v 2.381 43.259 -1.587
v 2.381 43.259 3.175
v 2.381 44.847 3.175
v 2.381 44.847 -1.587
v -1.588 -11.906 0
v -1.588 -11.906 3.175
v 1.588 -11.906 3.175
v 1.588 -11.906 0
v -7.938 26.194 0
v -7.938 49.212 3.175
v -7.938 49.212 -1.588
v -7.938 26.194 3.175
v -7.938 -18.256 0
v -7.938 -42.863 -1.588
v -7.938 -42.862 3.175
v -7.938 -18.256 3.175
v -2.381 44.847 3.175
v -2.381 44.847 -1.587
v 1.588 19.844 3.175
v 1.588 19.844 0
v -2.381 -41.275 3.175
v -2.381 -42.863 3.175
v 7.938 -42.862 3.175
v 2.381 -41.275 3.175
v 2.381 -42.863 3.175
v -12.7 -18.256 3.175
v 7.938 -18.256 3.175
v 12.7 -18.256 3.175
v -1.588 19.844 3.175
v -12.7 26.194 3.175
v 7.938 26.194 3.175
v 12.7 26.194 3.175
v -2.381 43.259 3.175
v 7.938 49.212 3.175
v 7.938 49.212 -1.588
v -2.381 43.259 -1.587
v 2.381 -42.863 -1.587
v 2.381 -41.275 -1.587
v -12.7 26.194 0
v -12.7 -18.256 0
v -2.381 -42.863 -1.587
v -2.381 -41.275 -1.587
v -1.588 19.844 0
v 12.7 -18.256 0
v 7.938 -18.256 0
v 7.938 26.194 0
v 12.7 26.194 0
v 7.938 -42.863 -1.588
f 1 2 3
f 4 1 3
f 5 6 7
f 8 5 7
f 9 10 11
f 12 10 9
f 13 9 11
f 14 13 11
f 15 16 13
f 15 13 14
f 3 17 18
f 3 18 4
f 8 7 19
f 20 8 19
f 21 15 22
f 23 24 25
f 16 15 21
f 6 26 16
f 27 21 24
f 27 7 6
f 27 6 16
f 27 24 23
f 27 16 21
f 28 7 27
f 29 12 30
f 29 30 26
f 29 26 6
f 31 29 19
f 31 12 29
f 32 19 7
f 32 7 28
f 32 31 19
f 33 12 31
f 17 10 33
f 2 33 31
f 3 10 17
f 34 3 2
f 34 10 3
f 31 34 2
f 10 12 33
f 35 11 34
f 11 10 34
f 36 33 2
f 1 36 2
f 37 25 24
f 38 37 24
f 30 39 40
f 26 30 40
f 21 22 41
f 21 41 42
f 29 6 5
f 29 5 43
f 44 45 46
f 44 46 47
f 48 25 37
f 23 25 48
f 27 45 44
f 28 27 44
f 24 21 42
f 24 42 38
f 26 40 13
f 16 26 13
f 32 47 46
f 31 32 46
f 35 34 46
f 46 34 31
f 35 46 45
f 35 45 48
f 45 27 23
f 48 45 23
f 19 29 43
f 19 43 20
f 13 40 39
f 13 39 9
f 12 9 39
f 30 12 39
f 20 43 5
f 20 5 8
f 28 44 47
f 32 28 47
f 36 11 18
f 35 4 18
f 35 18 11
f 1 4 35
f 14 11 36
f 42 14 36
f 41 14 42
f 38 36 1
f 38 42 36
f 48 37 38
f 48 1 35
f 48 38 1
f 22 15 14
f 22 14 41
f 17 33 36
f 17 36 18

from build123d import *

# Parameters (mm, degrees)
F1_DEPTH = 3.175
F2_W     = 15.875
F2_H     = 92.075
F3_DEPTH = 1.5875
F4_W     = 3.175
F4_H     = 31.75
F5_DEPTH = 3.175
F6_W     = 4.7625
F6_H     = 1.5875
F7_DEPTH = 4.7635
F8_W     = 4.7625
F8_H     = 1.5875
F9_DEPTH = 4.7635


with BuildPart() as f1:
    # F0 (on Top) → F1 (new body)
    with BuildSketch(Plane.XY):
        Polygon((7.9375, 49.2125), (-7.9375, 49.2125), (-7.9375, 26.19375), (-12.7, 26.19375), (-12.7, -18.25625), (-7.9375, -18.25625), (-7.9375, -42.8625), (7.9375, -42.8625), (7.9375, -18.25625), (12.7, -18.25625), (12.7, 26.19375), (7.9375, 26.19375), align=None)
    extrude(amount=F1_DEPTH)

    # F2 (on face) → F3 (join)
    with BuildSketch(Plane(origin=(0, 0, 0), x_dir=(1, 0, 0), z_dir=(0, 0, -1))):
        with Locations((0, -3.175)):
            Rectangle(F2_W, F2_H)
    extrude(amount=F3_DEPTH)

    # F4 (on face) → F5 (cut)
    with BuildSketch(Plane.XY.offset(3.175)):
        with Locations((0, 3.96875)):
            Rectangle(F4_W, F4_H)
    extrude(amount=-F5_DEPTH, mode=Mode.SUBTRACT)

    # F6 (on face) → F7 (cut, through all)
    with BuildSketch(Plane.XY.offset(3.175)):
        with Locations((0, -42.06875)):
            Rectangle(F6_W, F6_H)
    extrude(amount=-F7_DEPTH, mode=Mode.SUBTRACT)

    # F8 (on face) → F9 (cut, through all)
    with BuildSketch(Plane.XY.offset(3.175)):
        with Locations((0, 44.053125)):
            Rectangle(F8_W, F8_H)
    extrude(amount=-F9_DEPTH, mode=Mode.SUBTRACT)


solid = f1.part
